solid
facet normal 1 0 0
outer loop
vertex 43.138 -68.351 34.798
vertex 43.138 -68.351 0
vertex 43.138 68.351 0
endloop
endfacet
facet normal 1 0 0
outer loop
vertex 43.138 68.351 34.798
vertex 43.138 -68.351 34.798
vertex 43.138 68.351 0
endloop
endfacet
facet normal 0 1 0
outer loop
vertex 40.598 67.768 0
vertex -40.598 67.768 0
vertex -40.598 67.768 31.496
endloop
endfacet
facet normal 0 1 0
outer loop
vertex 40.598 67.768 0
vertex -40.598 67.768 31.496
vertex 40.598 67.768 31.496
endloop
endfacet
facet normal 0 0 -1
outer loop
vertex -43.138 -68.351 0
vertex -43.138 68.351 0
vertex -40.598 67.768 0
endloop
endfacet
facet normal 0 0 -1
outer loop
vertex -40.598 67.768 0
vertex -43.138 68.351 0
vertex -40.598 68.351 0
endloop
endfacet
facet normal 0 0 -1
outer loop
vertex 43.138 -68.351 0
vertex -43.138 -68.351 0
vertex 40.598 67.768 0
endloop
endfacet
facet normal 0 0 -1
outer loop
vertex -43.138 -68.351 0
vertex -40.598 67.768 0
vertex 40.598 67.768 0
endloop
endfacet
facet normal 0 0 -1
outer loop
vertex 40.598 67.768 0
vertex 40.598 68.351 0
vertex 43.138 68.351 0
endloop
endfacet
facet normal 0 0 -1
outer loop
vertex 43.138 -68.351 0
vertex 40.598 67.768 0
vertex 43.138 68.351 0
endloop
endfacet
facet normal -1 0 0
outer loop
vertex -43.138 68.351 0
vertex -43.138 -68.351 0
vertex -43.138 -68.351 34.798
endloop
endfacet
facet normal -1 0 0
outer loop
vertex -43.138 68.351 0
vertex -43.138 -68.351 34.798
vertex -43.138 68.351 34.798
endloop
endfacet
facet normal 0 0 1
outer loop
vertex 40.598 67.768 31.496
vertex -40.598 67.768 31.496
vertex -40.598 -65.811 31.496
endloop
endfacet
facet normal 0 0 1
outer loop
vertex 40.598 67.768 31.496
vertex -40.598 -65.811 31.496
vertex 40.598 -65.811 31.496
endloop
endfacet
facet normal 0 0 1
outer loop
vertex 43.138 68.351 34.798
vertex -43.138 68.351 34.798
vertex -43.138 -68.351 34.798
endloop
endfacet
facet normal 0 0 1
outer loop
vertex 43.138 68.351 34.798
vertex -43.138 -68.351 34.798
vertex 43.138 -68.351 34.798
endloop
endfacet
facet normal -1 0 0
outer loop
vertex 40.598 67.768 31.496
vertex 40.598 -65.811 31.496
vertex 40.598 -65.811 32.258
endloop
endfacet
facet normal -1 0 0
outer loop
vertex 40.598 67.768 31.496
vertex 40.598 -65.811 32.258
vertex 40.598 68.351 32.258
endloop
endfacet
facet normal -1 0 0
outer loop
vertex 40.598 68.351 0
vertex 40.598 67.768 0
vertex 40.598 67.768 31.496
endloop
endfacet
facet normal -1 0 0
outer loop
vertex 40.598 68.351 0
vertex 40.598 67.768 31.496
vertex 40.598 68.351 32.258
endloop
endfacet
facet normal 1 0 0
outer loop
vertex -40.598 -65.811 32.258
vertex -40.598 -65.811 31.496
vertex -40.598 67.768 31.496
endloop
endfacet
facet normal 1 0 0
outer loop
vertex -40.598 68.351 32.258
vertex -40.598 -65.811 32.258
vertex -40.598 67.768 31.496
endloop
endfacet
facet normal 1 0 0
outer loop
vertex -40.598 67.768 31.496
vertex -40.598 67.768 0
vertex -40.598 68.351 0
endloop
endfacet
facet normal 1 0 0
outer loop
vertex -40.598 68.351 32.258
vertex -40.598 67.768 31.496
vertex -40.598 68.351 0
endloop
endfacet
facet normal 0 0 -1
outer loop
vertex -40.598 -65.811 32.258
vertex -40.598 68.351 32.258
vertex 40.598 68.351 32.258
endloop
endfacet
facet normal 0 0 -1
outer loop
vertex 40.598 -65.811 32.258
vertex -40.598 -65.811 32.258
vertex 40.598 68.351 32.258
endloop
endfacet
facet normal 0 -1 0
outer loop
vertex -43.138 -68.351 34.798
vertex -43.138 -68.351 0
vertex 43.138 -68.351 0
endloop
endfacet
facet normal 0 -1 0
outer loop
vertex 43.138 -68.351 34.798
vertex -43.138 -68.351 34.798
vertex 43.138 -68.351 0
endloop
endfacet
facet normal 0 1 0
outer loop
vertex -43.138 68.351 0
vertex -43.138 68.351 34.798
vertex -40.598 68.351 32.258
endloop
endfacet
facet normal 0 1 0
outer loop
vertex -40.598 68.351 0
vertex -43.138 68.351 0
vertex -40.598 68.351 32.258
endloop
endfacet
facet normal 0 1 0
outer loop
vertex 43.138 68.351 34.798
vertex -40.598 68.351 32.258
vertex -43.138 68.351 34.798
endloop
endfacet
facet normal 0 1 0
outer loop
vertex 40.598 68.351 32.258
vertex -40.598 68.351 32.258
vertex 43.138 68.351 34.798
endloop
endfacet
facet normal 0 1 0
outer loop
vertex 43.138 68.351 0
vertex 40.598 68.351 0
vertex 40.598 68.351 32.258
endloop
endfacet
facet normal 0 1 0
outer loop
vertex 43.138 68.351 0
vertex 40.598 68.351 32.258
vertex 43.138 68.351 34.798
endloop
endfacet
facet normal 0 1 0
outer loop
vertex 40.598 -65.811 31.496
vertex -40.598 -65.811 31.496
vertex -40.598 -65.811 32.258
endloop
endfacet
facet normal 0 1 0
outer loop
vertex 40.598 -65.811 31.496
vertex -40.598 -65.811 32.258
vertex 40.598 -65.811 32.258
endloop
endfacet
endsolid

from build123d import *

# Parameters (mm, degrees)
F0_W     = 86.276724
F0_H     = 136.701972
F1_DEPTH = 34.798
F2_T     = -2.54
F3_W     = 84.527872
F3_H     = 135.53606
F4_DEPTH = 31.496


with BuildPart() as f1:
    # F0 (on Top) → F1 (new body)
    with BuildSketch(Plane.XY):
        Rectangle(F0_W, F0_H)
    extrude(amount=F1_DEPTH)

    # F2
    f2_openings = [f1.faces().sort_by_distance(p)[0] for p in [
        (0, 0, 0),
        (0, 68.350986, 17.399),
    ]]
    offset(amount=F2_T, openings=f2_openings)

    # F3 (on Top) → F4 (join)
    with BuildSketch(Plane.XY):
        Rectangle(F3_W, F3_H)
    extrude(amount=F4_DEPTH)


solid = f1.part
